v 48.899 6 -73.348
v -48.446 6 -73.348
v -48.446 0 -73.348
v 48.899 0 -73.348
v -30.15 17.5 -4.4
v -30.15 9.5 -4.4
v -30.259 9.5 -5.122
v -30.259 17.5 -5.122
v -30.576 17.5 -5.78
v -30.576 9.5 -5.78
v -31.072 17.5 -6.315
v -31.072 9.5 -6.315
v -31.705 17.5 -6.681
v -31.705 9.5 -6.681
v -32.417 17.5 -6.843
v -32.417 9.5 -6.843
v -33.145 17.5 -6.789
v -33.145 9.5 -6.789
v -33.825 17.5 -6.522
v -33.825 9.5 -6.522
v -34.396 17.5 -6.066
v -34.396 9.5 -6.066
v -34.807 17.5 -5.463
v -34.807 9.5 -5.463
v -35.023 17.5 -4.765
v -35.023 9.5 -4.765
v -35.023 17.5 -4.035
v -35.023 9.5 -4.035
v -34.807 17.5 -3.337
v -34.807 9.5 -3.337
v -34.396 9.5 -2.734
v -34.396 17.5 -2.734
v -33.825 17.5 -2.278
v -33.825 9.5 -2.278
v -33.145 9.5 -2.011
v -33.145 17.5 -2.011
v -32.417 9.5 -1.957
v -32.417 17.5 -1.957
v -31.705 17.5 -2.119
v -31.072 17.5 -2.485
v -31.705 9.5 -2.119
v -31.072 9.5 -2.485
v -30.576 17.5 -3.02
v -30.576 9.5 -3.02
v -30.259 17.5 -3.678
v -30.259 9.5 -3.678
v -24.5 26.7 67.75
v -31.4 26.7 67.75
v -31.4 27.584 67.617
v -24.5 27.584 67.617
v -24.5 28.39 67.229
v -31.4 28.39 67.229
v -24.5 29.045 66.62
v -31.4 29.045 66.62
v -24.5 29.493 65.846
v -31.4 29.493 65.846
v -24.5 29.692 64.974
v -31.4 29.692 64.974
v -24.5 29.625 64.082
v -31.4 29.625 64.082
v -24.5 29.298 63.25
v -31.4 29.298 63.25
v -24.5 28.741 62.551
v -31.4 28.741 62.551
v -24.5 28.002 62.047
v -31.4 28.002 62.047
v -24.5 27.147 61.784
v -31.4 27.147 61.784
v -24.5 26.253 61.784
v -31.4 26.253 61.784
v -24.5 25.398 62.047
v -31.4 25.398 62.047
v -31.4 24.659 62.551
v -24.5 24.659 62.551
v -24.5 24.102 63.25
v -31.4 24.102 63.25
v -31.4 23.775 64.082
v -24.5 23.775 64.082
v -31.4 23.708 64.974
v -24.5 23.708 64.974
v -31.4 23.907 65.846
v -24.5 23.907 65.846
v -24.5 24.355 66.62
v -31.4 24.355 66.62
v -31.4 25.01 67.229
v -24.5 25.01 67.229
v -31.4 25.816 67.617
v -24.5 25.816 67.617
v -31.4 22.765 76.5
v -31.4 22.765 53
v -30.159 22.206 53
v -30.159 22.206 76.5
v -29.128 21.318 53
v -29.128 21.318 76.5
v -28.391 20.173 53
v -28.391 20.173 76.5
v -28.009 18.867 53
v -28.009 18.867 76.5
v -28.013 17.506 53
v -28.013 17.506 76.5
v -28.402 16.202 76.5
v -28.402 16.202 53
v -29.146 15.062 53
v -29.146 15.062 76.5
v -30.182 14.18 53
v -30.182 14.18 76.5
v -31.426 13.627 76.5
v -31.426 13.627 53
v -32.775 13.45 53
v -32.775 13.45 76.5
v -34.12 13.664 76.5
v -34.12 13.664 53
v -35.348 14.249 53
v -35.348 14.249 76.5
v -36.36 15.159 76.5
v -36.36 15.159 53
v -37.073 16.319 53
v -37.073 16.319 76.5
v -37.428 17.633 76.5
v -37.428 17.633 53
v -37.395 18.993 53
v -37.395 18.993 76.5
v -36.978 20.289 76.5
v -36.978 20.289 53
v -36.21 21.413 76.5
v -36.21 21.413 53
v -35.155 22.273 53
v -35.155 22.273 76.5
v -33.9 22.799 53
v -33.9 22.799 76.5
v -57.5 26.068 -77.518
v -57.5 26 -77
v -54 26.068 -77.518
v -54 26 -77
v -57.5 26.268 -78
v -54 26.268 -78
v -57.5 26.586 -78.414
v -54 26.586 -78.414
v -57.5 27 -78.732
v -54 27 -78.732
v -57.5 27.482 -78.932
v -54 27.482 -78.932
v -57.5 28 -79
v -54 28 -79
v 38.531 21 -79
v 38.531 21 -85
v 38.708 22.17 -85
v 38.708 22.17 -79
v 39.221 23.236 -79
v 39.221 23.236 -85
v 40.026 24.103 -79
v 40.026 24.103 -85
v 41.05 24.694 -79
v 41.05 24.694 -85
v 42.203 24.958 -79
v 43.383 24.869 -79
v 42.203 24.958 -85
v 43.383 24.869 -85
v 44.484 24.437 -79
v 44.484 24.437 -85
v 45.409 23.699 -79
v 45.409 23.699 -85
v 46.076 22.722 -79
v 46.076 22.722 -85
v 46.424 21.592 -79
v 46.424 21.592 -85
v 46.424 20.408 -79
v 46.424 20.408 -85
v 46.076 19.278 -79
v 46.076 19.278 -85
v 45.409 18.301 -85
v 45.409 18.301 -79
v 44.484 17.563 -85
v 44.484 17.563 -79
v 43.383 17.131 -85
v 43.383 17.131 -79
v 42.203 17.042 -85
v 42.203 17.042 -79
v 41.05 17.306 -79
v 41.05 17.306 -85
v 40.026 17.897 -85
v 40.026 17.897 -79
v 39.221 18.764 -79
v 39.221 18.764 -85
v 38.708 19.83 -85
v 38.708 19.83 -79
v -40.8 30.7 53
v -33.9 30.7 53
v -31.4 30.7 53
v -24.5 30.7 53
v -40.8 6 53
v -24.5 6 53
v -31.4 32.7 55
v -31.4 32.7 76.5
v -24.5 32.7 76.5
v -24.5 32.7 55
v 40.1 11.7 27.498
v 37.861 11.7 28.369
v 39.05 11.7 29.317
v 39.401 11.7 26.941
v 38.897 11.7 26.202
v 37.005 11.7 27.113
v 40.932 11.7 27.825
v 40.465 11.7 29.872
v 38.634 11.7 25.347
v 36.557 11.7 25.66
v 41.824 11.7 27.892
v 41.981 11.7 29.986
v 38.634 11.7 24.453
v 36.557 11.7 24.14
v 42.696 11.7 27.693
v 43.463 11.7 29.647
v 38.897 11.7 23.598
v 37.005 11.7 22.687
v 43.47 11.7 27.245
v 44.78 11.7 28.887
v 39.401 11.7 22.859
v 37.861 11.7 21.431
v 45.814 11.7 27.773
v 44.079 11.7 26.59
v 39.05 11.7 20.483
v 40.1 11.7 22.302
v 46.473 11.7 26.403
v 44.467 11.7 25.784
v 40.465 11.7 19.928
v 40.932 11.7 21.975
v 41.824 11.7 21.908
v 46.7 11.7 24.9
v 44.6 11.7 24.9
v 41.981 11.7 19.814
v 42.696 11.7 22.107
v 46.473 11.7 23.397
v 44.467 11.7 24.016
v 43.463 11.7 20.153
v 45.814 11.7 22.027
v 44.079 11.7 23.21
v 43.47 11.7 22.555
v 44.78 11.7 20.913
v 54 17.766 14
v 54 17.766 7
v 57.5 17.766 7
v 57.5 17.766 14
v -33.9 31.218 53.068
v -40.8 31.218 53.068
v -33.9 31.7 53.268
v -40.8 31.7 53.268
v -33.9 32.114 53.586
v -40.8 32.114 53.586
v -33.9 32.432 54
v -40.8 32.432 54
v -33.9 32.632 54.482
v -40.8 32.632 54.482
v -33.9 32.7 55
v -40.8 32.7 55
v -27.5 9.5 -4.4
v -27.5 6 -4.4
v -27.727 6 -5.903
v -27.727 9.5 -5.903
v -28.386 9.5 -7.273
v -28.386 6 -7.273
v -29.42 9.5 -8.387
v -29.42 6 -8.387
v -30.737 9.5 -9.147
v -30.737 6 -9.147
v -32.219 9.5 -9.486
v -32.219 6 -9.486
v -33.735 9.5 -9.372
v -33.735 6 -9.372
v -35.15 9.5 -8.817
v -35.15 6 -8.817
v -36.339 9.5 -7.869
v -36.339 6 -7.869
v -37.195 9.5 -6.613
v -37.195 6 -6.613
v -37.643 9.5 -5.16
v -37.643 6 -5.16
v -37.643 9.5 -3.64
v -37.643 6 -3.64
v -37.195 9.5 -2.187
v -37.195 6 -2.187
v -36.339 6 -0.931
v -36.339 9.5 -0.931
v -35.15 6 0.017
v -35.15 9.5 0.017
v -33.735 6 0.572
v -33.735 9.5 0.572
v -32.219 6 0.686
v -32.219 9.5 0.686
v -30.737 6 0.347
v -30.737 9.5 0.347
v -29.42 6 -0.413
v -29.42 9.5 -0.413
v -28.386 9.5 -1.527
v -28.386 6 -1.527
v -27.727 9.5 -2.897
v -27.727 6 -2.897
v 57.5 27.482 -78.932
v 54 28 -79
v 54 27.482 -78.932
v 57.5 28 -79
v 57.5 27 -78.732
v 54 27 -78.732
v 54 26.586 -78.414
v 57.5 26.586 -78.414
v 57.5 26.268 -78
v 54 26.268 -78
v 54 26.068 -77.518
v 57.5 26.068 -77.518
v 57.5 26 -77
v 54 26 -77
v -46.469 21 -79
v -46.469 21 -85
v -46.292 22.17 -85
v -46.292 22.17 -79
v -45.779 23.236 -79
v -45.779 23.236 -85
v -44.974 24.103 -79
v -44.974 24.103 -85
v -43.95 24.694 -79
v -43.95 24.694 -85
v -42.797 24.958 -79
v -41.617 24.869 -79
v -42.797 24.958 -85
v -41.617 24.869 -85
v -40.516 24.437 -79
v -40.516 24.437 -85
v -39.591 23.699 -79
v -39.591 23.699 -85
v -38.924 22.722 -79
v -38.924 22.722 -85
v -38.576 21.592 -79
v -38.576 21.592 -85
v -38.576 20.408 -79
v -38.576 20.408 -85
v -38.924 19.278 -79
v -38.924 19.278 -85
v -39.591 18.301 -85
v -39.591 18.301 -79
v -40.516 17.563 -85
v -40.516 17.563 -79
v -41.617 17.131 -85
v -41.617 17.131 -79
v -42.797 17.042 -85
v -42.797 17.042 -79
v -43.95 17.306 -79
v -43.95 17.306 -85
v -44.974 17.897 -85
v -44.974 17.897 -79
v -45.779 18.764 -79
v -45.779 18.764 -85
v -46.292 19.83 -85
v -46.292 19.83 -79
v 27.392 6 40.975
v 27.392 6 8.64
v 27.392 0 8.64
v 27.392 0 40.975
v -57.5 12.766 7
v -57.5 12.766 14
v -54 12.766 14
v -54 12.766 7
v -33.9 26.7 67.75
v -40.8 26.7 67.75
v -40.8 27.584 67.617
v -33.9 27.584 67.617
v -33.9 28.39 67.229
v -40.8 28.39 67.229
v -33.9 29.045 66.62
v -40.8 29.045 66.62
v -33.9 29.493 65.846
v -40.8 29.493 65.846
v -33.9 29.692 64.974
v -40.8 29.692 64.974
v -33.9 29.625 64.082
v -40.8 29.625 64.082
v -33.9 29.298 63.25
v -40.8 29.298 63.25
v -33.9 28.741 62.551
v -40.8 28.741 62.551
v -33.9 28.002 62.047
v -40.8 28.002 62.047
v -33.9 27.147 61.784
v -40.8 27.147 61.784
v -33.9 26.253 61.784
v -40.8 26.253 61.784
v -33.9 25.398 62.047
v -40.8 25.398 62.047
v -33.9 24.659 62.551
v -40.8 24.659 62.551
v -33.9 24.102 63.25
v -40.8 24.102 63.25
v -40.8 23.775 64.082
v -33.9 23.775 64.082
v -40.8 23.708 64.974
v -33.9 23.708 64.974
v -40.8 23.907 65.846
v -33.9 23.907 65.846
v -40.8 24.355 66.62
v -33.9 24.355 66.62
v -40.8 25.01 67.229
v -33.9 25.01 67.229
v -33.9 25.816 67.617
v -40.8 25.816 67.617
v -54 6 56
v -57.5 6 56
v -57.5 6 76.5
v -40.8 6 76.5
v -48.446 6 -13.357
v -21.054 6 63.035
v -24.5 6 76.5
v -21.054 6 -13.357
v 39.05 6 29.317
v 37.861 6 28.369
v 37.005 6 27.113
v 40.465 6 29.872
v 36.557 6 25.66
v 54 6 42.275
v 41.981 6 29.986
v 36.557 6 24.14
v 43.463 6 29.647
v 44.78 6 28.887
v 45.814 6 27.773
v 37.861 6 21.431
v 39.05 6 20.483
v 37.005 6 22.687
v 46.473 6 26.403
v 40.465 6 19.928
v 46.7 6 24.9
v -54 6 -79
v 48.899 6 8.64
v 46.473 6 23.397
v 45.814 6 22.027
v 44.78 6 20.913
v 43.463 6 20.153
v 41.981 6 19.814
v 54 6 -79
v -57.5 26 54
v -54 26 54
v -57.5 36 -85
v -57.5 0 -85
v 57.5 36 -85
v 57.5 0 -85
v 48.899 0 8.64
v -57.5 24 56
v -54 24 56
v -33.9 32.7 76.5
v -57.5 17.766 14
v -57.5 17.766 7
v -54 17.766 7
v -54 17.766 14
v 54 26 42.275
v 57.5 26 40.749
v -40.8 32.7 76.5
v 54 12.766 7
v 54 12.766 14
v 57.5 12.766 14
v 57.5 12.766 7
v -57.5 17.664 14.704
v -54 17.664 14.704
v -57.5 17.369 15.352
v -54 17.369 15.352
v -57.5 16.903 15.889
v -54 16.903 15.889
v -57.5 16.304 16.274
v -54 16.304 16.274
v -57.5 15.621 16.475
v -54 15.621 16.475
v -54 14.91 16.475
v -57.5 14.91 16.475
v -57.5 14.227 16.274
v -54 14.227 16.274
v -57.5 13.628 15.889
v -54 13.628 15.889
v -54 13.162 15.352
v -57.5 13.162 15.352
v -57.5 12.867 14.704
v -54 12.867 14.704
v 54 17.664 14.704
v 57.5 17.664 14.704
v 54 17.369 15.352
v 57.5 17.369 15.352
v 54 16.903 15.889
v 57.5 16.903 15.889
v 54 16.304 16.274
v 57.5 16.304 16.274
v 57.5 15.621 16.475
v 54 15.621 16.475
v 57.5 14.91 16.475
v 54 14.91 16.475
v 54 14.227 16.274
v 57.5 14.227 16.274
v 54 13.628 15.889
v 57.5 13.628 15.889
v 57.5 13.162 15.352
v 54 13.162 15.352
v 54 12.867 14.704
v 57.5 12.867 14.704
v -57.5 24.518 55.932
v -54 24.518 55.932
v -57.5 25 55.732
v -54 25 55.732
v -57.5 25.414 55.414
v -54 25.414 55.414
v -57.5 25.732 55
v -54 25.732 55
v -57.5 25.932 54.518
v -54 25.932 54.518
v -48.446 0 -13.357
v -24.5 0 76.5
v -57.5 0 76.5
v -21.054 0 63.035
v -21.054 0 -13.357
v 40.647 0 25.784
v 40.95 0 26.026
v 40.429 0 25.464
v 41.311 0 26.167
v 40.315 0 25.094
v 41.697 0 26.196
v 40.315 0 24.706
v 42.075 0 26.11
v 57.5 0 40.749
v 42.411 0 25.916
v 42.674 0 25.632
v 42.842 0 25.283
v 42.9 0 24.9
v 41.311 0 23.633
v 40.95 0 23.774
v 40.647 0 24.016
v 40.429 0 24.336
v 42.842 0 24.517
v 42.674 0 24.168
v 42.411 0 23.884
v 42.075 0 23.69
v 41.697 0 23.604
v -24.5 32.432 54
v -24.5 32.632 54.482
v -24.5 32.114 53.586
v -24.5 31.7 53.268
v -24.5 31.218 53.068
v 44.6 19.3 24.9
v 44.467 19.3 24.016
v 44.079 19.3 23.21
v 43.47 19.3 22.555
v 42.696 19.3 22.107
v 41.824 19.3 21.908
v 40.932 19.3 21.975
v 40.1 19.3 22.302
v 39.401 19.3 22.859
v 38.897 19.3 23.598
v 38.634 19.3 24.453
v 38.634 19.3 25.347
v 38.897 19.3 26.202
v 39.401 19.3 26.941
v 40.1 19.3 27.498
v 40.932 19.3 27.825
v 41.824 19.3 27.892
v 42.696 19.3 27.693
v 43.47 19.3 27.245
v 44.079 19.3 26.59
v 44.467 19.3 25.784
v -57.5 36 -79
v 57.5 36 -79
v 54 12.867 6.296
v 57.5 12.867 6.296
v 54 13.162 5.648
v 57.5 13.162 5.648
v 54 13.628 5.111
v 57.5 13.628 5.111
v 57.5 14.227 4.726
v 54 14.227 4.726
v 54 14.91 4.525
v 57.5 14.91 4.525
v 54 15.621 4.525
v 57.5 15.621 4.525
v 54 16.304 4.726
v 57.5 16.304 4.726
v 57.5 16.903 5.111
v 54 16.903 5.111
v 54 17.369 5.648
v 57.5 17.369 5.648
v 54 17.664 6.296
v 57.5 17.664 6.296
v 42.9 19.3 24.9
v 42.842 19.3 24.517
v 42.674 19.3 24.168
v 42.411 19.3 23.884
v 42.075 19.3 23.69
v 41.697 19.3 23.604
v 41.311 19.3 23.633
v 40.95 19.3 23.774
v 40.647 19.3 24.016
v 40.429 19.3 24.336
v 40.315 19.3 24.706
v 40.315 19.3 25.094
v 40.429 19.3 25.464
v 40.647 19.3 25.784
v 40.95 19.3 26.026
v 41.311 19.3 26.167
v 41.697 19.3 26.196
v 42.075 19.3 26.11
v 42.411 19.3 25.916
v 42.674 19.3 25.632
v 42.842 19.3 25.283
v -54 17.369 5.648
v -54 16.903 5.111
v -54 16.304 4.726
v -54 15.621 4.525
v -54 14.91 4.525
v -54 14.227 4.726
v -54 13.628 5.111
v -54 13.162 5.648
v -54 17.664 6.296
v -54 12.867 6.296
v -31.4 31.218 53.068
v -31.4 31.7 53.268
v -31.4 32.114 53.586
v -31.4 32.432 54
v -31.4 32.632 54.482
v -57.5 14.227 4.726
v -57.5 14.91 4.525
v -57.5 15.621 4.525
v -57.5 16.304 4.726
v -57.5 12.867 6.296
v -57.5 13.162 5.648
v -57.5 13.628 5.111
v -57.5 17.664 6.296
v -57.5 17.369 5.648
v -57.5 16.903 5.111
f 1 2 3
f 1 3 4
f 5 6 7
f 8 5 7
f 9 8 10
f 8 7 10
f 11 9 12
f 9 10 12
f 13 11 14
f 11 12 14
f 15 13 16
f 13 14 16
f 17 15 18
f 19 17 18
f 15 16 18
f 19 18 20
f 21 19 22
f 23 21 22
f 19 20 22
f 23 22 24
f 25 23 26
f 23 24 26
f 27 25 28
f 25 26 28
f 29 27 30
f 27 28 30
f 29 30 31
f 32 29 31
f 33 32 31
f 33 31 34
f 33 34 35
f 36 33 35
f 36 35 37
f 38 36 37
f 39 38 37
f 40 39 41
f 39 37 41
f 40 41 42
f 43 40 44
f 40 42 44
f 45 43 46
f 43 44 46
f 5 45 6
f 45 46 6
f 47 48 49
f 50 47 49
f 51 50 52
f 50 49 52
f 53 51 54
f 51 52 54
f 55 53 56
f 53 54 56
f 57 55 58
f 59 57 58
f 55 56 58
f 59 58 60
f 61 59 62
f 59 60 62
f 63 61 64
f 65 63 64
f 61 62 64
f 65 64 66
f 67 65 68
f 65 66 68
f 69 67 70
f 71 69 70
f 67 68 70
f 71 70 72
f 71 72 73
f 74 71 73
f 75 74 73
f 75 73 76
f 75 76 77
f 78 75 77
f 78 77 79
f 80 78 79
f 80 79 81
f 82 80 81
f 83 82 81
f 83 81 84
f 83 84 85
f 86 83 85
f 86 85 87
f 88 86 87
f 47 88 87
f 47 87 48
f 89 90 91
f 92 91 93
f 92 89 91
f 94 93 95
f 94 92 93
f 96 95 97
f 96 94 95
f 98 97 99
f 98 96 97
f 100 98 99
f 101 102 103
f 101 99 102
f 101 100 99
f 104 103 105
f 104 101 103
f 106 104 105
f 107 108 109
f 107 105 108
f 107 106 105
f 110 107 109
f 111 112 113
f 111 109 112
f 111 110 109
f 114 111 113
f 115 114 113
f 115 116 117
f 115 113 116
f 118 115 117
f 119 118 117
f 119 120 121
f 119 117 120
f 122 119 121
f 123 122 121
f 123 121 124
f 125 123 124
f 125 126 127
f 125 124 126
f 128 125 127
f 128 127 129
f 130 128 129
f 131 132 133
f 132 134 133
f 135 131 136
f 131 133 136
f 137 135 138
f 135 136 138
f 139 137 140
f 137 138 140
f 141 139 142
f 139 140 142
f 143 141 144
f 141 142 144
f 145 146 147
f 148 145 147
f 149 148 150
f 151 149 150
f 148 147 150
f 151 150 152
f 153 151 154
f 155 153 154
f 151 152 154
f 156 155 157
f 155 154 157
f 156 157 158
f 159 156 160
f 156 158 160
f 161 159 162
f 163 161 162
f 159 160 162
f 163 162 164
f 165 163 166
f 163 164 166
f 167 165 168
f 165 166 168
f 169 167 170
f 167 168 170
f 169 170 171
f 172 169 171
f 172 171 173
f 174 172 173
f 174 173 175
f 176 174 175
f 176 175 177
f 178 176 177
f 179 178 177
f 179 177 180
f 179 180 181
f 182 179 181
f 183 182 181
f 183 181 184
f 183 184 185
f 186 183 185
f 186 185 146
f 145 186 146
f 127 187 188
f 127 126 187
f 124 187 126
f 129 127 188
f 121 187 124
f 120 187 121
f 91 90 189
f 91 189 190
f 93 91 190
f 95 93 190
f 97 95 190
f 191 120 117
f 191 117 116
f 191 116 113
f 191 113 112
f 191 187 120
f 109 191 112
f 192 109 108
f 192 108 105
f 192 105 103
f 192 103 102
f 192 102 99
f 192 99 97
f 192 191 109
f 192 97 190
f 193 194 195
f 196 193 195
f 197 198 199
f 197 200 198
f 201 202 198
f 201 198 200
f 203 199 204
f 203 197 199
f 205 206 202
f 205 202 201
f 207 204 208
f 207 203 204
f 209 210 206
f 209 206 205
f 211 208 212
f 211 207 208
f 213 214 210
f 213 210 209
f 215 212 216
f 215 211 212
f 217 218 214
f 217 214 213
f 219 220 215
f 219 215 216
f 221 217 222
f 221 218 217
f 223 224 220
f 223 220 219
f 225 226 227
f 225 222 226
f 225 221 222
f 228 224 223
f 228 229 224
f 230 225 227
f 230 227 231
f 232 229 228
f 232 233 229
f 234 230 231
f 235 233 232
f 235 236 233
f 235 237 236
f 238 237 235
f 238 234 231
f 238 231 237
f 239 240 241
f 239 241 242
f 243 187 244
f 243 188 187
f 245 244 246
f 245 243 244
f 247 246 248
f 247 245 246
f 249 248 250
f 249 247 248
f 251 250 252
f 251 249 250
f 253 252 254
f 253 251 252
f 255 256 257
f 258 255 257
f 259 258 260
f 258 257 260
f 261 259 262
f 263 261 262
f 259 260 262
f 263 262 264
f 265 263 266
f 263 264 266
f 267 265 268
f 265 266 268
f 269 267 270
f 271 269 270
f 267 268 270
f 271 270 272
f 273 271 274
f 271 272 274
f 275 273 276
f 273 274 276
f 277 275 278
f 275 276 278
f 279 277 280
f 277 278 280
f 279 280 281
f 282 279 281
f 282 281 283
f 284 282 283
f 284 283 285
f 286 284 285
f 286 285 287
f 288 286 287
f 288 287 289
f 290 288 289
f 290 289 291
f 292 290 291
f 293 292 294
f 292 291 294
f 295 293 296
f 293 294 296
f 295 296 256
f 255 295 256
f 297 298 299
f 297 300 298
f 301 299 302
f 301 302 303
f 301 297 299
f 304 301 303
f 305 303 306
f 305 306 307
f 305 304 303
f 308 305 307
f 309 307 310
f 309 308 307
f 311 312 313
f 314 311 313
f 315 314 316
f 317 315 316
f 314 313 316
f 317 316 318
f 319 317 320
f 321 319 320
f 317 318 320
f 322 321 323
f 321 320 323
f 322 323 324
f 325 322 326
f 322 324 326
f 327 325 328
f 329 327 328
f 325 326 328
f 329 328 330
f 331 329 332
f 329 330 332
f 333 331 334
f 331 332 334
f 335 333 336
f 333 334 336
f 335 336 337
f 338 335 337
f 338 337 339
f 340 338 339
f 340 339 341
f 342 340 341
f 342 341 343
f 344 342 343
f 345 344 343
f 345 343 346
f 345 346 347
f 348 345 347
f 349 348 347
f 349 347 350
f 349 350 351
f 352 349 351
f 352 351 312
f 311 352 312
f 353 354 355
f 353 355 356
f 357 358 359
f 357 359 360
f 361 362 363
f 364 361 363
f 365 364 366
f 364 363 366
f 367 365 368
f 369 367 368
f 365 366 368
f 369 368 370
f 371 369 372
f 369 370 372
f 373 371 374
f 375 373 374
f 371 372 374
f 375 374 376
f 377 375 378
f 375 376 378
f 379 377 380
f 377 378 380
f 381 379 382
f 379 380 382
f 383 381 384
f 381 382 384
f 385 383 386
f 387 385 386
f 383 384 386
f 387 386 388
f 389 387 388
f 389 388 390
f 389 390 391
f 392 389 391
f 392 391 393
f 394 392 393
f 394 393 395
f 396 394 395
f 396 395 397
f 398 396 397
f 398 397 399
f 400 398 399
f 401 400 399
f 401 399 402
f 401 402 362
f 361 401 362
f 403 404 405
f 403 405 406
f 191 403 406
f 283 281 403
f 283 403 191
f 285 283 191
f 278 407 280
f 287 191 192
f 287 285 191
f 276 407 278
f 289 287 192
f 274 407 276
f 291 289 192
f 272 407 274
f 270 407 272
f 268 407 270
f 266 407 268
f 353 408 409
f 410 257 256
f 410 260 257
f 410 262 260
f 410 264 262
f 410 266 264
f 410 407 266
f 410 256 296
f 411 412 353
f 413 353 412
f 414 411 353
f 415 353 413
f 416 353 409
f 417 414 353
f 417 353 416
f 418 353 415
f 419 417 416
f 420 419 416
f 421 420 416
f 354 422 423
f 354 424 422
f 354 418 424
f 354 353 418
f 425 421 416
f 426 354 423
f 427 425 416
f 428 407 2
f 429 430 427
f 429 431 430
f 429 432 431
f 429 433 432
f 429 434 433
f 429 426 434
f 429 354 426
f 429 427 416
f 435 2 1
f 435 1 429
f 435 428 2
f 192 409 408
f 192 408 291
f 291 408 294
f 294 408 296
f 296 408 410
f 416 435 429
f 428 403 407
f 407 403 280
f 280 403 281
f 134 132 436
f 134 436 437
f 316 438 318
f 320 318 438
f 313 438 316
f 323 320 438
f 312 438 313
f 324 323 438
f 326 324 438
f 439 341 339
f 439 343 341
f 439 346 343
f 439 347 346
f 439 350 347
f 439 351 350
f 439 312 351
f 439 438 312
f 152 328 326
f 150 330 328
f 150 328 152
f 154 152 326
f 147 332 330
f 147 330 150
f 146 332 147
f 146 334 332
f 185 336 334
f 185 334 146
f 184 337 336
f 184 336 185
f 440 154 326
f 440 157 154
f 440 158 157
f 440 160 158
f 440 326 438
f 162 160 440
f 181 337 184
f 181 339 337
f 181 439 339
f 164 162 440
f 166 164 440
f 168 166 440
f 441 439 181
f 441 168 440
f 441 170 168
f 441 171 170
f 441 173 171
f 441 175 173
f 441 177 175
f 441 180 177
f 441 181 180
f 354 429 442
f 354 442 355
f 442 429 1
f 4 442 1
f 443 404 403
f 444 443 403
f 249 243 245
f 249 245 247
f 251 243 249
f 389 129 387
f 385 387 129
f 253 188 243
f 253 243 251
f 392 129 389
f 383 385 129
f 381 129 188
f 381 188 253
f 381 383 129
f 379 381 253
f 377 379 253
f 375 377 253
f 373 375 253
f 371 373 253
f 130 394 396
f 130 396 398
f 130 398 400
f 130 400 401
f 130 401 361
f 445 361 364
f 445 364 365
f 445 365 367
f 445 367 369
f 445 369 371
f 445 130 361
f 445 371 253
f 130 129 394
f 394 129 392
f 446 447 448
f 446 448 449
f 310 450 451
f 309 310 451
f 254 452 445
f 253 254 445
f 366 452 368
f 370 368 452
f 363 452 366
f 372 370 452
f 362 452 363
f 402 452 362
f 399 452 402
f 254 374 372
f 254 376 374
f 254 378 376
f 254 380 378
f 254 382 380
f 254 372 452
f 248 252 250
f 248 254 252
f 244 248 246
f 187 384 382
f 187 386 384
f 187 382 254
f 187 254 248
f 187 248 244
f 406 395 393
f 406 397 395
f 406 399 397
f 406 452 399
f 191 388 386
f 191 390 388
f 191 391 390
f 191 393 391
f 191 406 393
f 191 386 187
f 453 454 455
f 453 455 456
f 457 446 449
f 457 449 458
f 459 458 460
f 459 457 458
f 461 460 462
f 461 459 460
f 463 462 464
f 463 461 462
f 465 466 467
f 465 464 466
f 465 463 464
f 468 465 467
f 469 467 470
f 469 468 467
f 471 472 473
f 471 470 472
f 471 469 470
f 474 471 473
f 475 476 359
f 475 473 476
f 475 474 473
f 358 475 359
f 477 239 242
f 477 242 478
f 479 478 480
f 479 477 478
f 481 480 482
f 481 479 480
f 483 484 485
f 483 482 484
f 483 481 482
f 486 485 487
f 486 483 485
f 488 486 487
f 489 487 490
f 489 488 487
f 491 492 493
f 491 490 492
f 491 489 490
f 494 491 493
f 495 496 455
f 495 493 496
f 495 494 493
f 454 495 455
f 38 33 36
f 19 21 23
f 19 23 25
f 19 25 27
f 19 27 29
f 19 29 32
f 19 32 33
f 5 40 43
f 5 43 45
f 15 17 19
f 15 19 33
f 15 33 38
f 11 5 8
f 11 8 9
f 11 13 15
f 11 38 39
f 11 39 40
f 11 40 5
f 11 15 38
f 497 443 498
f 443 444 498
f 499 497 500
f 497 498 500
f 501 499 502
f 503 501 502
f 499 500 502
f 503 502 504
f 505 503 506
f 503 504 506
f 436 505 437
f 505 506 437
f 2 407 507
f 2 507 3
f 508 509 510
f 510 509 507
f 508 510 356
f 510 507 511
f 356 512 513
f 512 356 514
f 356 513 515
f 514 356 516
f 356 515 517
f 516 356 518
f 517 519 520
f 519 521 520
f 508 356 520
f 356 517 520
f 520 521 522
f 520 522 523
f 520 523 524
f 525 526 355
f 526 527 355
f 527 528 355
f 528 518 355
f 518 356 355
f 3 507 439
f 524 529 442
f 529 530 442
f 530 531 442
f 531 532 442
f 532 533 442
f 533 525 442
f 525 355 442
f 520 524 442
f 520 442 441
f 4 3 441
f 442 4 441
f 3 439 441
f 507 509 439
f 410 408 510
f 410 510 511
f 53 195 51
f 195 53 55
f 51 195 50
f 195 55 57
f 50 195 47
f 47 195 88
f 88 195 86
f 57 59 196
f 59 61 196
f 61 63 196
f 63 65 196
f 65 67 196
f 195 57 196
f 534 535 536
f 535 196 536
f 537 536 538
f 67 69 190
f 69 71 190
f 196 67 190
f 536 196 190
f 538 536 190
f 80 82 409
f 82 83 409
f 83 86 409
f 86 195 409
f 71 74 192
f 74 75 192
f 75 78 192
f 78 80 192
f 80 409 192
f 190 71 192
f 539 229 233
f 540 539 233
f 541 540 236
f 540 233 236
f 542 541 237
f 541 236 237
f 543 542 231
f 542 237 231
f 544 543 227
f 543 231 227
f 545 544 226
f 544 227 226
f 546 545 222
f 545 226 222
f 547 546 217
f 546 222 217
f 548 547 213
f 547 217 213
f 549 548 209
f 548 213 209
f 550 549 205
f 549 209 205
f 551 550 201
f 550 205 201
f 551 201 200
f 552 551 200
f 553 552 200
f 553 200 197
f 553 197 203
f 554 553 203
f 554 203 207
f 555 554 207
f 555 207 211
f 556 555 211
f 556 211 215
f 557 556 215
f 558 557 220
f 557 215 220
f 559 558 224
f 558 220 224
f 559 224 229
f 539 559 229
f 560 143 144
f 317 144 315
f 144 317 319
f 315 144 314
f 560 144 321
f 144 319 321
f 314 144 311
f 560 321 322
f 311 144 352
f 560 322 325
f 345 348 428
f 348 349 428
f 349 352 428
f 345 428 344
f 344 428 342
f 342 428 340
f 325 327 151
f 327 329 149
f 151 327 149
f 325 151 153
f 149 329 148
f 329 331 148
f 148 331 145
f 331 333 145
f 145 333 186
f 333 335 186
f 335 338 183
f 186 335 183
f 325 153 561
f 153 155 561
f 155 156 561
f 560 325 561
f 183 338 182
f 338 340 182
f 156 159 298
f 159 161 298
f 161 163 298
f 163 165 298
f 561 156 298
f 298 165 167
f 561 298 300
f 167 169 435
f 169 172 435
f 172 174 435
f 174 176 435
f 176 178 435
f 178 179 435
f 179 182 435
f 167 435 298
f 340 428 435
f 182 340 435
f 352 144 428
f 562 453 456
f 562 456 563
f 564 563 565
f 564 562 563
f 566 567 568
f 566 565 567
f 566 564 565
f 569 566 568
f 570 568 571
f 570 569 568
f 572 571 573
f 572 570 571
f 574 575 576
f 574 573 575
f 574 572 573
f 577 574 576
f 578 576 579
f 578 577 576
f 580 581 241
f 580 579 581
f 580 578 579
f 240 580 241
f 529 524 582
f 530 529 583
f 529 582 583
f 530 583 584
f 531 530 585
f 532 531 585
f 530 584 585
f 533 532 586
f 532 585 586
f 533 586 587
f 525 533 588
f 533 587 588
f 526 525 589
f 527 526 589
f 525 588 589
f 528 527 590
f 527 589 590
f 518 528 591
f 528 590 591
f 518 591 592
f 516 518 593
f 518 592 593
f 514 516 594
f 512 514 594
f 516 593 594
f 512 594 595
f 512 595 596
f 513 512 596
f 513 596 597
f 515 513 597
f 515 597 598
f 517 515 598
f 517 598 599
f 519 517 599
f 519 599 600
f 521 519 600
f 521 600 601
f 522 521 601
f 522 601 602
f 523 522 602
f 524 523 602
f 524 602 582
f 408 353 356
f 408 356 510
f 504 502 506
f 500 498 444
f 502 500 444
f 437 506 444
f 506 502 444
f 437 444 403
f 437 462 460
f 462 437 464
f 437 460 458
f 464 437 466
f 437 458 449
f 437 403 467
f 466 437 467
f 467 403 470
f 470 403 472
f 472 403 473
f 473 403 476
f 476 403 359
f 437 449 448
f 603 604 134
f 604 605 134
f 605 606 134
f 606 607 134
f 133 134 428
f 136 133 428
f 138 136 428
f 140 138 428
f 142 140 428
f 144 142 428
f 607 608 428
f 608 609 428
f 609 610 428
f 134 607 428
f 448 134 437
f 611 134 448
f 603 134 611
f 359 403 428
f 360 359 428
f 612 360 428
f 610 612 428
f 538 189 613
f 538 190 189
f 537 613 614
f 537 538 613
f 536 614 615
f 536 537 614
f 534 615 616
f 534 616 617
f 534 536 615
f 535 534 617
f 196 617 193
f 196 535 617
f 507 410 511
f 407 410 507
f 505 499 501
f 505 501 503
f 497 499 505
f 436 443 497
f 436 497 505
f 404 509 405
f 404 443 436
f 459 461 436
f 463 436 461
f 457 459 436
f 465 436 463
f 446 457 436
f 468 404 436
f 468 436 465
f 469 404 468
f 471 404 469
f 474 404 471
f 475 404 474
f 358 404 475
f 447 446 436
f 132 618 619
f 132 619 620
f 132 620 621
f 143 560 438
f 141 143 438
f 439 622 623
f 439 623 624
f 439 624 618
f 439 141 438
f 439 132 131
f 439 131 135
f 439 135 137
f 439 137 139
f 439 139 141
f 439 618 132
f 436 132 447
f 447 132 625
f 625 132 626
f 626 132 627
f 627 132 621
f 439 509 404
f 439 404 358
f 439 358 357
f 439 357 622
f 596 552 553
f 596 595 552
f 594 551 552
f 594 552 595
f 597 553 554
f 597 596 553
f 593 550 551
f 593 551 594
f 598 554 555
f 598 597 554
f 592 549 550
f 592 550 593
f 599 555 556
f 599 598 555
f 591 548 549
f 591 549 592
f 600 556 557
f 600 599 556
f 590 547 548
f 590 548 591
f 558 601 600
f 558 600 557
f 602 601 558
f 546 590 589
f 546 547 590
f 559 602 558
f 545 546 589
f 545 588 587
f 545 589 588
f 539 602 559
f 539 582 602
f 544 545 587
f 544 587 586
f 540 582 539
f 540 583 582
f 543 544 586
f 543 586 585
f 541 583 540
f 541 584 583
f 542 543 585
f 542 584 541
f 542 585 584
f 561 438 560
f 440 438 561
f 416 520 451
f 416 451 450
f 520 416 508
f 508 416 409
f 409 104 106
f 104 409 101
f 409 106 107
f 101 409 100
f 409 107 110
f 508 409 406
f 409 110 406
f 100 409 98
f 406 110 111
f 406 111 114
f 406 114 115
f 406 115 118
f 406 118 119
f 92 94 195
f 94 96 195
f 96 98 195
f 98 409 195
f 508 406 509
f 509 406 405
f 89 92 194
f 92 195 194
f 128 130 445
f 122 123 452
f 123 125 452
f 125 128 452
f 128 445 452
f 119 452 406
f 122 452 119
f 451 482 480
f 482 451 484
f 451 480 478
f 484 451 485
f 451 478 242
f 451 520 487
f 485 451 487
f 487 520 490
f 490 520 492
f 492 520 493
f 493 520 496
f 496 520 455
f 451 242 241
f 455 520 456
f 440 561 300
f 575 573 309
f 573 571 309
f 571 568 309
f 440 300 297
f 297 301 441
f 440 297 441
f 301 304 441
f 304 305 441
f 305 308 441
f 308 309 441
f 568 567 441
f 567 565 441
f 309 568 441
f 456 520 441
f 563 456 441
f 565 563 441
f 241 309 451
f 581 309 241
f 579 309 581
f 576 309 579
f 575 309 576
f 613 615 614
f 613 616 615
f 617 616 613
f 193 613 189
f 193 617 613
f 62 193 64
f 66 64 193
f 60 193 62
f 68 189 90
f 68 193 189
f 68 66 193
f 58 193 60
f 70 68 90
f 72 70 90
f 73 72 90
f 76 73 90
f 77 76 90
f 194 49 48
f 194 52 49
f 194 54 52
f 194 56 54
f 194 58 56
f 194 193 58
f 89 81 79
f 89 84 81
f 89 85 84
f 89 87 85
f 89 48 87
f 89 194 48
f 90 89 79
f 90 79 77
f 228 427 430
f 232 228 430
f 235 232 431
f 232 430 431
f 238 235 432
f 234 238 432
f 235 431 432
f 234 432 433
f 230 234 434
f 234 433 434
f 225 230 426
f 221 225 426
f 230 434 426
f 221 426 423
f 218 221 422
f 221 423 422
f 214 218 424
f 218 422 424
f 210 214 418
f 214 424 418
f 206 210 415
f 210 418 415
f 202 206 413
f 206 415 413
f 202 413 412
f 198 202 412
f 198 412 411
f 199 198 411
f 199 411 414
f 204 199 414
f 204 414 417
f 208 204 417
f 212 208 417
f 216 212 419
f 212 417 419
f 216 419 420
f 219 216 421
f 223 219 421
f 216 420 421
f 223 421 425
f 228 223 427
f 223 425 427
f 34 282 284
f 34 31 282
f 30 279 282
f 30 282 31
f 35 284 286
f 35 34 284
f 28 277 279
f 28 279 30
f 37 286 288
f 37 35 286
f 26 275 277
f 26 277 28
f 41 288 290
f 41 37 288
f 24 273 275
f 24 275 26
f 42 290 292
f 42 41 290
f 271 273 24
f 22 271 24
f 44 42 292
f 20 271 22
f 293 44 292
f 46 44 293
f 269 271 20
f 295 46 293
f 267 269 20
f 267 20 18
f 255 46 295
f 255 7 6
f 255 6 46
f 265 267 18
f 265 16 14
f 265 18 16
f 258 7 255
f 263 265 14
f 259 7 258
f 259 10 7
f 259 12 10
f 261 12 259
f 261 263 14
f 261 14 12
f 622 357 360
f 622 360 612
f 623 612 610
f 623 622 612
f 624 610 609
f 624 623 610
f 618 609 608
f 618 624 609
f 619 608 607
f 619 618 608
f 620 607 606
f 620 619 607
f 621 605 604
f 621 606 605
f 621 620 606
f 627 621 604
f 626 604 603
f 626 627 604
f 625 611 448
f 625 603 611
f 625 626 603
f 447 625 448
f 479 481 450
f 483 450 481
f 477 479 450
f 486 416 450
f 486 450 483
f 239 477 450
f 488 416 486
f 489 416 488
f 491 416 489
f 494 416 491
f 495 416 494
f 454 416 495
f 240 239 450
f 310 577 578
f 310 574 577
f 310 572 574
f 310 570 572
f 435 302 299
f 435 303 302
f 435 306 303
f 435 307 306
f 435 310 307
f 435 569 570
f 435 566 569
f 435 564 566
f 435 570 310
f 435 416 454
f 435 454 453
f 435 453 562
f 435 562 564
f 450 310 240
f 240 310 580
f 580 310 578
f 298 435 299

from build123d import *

# Parameters (mm, degrees)
SKETCH1_W                               = 115
SKETCH1_H                               = 170
BACK_WALL_EXTRUDE_DEPTH                 = 6
SKETCH2_W                               = 115
SKETCH2_H                               = 6
BOTTOM_PLATE_EXTRUDE_DEPTH              = 30
SKETCH3_W                               = 3.5
SKETCH3_H                               = 135
SIDE_WALLS_EXTRUDE_DEPTH                = 20
SKETCH4_W                               = 16.3
SKETCH4_H                               = 23.5
DIAL_INDIACTOR_HOLDER_EXTRUDE_DEPTH     = 26.7
SKETCH6_R                               = 3
DIAL_INDICATOR_TIGHTENER_HOLE_CUT_DEPTH = 26.7
DIAL_INDICATOR_HOLDER_CUT_DEPTH         = 30
SKETCH7_R                               = 5.1
ARM_BASE_EXTRUDE_DEPTH                  = 5.7
SKETCH8_R                               = 3
ARM_AXLE_EXTRUDE_DEPTH                  = 7.6
SKETCH9_R                               = 5.1
GUIDE_WHEEL_BASE_EXTRUDE_DEPTH          = 3.5
SKETCH10_R                              = 2.45
GUIDE_WHEEL_AXLE_EXTRUDE_DEPTH          = 8
FILAMENT_SLOT_CUT_DEPTH                 = 116
SKETCH13_R                              = 3.96875
MOUNTING_HOLES_CUT_DEPTH                = 8
FILLET1_R                               = 2
SKETCH15_R                              = 1.3
SCREW_HOLE_CUT_DEPTH                    = 20.3
WEIGHT_REDUCTION_CUT_REACH              = 8
WEIGHT_REDUCTION_CUT_2_DEPTH            = 20


with BuildPart() as part:
    # Sketch1 → Back Wall Extrude (new body)
    with BuildSketch(Plane(origin=(0, 0, 0), x_dir=(1, 0, 0), z_dir=(0, 1, 0))):
        Rectangle(SKETCH1_W, SKETCH1_H)
    extrude(amount=BACK_WALL_EXTRUDE_DEPTH)

    # Sketch2 → Bottom Plate Extrude (add)
    with BuildSketch(Plane(origin=(0, 6, 0), x_dir=(1, 0, 0), z_dir=(0, 1, 0))):
        with Locations((0, 82)):
            Rectangle(SKETCH2_W, SKETCH2_H)
    extrude(amount=BOTTOM_PLATE_EXTRUDE_DEPTH)

    # Sketch3 → Side Walls Extrude (add)
    with BuildSketch(Plane(origin=(0, 6, 0), x_dir=(1, 0, 0), z_dir=(0, 1, 0))):
        with Locations((-55.75, 11.5)):
            Rectangle(SKETCH3_W, SKETCH3_H)
        with Locations((55.75, 11.5)):
            Rectangle(SKETCH3_W, SKETCH3_H)
    extrude(amount=SIDE_WALLS_EXTRUDE_DEPTH)

    # Sketch4 → Dial Indiactor Holder Extrude (add)
    with BuildSketch(Plane(origin=(0, 6, 0), x_dir=(1, 0, 0), z_dir=(0, 1, 0))):
        with Locations((-32.65, -64.75)):
            Rectangle(SKETCH4_W, SKETCH4_H)
    extrude(amount=DIAL_INDIACTOR_HOLDER_EXTRUDE_DEPTH)

    # Sketch6 → Dial Indicator Tightener Hole Cut (cut)
    with BuildSketch(Plane.ZY.offset(40.8)):
        with Locations((64.75, 26.7)):
            Circle(SKETCH6_R)
    extrude(amount=-DIAL_INDICATOR_TIGHTENER_HOLE_CUT_DEPTH, mode=Mode.SUBTRACT)

    # Sketch18 → Dial Indicator Holder Cut (cut)
    with BuildSketch(Plane.XY.offset(76.5)):
        with BuildLine():
            Line((-33.9, 32.7), (-31.4, 32.7))
            Line((-31.4, 32.7), (-31.4, 22.765337686))
            ThreePointArc((-31.4, 22.765337686), (-32.775371215, 13.450428626), (-33.9, 22.798925129))
            Line((-33.9, 22.798925129), (-33.9, 32.7))
        make_face()
    extrude(amount=-DIAL_INDICATOR_HOLDER_CUT_DEPTH, mode=Mode.SUBTRACT)

    # Sketch7 → Arm Base Extrude (add)
    with BuildSketch(Plane(origin=(0, 6, 0), x_dir=(1, 0, 0), z_dir=(0, 1, 0))):
        with Locations((41.6, -24.9)):
            Circle(SKETCH7_R)
    extrude(amount=ARM_BASE_EXTRUDE_DEPTH)

    # Sketch8 → Arm Axle Extrude (add)
    with BuildSketch(Plane(origin=(0, 11.7, 0), x_dir=(1, 0, 0), z_dir=(0, 1, 0))):
        with Locations((41.6, -24.9)):
            Circle(SKETCH8_R)
    extrude(amount=ARM_AXLE_EXTRUDE_DEPTH)

    # Sketch9 → Guide Wheel Base Extrude (add)
    with BuildSketch(Plane(origin=(0, 6, 0), x_dir=(1, 0, 0), z_dir=(0, 1, 0))):
        with Locations((-32.6, 4.4)):
            Circle(SKETCH9_R)
    extrude(amount=GUIDE_WHEEL_BASE_EXTRUDE_DEPTH)

    # Sketch10 → Guide Wheel Axle Extrude (add)
    with BuildSketch(Plane(origin=(0, 9.5, 0), x_dir=(1, 0, 0), z_dir=(0, 1, 0))):
        with Locations((-32.6, 4.4)):
            Circle(SKETCH10_R)
    extrude(amount=GUIDE_WHEEL_AXLE_EXTRUDE_DEPTH)

    # Sketch11 → Filament Slot Cut (cut, through all)
    with BuildSketch(Plane.ZY.offset(57.5)):
        with BuildLine():
            Line((14, 12.765586), (7, 12.765586))
            ThreePointArc((7, 12.765586), (4.5, 15.265586), (7, 17.765586))
            Line((7, 17.765586), (14, 17.765586))
            ThreePointArc((14, 17.765586), (16.5, 15.265586), (14, 12.765586))
        make_face()
    extrude(amount=-FILAMENT_SLOT_CUT_DEPTH, mode=Mode.SUBTRACT)

    # Sketch13 → Mounting Holes Cut (cut)
    with BuildSketch(Plane(origin=(0, 0, -85), x_dir=(-1, 0, 0), z_dir=(0, 0, -1))):
        with Locations((42.5, 21)):
            Circle(SKETCH13_R)
        with Locations((-42.5, 21)):
            Circle(SKETCH13_R)
    extrude(amount=-MOUNTING_HOLES_CUT_DEPTH, mode=Mode.SUBTRACT)

    # Fillet1
    fillet1_edges = [part.edges().sort_by_distance(p)[0] for p in [
        (-55.75, 26, 56),
        (-55.75, 26, -79),
        (55.75, 26, -79),
        (55.75, 26, 56),
        (-27.95, 32.7, 53),
        (-37.35, 32.7, 53),
        (-57.5, 3, 85),
    ]]
    fillet(fillet1_edges, radius=FILLET1_R)

    # Sketch15 → Screw Hole Cut (cut, through all)
    with BuildSketch(Plane(origin=(0, 19.3, 0), x_dir=(1, 0, 0), z_dir=(0, 1, 0))):
        with Locations((41.6, -24.9)):
            Circle(SKETCH15_R)
    extrude(amount=-SCREW_HOLE_CUT_DEPTH, mode=Mode.SUBTRACT)

    # Sketch21 → Weight Reduction Cut (cut, up to next)
    with BuildSketch(Plane(origin=(0, 6, 0), x_dir=(1, 0, 0), z_dir=(0, 1, 0)), mode=Mode.PRIVATE) as weight_reduction_cut_sk1:
        Polygon((-48.44610903, 73.348314607), (48.898876404, 73.348314607), (48.898876404, 13.356637536), (48.898876404, -8.639749456), (27.392426134, -8.639749456), (27.392426134, -40.975447357), (-21.053682896, -63.034891603), (-21.053682896, 13.356637536), (-48.44610903, 13.356637536), align=None)
    weight_reduction_cut_tool1 = extrude(weight_reduction_cut_sk1.sketch, amount=-WEIGHT_REDUCTION_CUT_REACH, mode=Mode.PRIVATE) & part.part
    add(weight_reduction_cut_tool1.solids().sort_by_distance((2.646642, 6, -20.266546))[0], mode=Mode.SUBTRACT)

    # Sketch22 → Weight Reduction Cut 2 (cut, symmetric)
    with BuildSketch(Plane(origin=(0, 6, 0), x_dir=(1, 0, 0), z_dir=(0, 1, 0))):
        Polygon((57.5, -40.74906367), (-24.5, -76.5), (-57.5, -76.5), (-57.5, -85), (57.5, -85), align=None)
    extrude(amount=WEIGHT_REDUCTION_CUT_2_DEPTH, both=True, mode=Mode.SUBTRACT)


solid = part.part
